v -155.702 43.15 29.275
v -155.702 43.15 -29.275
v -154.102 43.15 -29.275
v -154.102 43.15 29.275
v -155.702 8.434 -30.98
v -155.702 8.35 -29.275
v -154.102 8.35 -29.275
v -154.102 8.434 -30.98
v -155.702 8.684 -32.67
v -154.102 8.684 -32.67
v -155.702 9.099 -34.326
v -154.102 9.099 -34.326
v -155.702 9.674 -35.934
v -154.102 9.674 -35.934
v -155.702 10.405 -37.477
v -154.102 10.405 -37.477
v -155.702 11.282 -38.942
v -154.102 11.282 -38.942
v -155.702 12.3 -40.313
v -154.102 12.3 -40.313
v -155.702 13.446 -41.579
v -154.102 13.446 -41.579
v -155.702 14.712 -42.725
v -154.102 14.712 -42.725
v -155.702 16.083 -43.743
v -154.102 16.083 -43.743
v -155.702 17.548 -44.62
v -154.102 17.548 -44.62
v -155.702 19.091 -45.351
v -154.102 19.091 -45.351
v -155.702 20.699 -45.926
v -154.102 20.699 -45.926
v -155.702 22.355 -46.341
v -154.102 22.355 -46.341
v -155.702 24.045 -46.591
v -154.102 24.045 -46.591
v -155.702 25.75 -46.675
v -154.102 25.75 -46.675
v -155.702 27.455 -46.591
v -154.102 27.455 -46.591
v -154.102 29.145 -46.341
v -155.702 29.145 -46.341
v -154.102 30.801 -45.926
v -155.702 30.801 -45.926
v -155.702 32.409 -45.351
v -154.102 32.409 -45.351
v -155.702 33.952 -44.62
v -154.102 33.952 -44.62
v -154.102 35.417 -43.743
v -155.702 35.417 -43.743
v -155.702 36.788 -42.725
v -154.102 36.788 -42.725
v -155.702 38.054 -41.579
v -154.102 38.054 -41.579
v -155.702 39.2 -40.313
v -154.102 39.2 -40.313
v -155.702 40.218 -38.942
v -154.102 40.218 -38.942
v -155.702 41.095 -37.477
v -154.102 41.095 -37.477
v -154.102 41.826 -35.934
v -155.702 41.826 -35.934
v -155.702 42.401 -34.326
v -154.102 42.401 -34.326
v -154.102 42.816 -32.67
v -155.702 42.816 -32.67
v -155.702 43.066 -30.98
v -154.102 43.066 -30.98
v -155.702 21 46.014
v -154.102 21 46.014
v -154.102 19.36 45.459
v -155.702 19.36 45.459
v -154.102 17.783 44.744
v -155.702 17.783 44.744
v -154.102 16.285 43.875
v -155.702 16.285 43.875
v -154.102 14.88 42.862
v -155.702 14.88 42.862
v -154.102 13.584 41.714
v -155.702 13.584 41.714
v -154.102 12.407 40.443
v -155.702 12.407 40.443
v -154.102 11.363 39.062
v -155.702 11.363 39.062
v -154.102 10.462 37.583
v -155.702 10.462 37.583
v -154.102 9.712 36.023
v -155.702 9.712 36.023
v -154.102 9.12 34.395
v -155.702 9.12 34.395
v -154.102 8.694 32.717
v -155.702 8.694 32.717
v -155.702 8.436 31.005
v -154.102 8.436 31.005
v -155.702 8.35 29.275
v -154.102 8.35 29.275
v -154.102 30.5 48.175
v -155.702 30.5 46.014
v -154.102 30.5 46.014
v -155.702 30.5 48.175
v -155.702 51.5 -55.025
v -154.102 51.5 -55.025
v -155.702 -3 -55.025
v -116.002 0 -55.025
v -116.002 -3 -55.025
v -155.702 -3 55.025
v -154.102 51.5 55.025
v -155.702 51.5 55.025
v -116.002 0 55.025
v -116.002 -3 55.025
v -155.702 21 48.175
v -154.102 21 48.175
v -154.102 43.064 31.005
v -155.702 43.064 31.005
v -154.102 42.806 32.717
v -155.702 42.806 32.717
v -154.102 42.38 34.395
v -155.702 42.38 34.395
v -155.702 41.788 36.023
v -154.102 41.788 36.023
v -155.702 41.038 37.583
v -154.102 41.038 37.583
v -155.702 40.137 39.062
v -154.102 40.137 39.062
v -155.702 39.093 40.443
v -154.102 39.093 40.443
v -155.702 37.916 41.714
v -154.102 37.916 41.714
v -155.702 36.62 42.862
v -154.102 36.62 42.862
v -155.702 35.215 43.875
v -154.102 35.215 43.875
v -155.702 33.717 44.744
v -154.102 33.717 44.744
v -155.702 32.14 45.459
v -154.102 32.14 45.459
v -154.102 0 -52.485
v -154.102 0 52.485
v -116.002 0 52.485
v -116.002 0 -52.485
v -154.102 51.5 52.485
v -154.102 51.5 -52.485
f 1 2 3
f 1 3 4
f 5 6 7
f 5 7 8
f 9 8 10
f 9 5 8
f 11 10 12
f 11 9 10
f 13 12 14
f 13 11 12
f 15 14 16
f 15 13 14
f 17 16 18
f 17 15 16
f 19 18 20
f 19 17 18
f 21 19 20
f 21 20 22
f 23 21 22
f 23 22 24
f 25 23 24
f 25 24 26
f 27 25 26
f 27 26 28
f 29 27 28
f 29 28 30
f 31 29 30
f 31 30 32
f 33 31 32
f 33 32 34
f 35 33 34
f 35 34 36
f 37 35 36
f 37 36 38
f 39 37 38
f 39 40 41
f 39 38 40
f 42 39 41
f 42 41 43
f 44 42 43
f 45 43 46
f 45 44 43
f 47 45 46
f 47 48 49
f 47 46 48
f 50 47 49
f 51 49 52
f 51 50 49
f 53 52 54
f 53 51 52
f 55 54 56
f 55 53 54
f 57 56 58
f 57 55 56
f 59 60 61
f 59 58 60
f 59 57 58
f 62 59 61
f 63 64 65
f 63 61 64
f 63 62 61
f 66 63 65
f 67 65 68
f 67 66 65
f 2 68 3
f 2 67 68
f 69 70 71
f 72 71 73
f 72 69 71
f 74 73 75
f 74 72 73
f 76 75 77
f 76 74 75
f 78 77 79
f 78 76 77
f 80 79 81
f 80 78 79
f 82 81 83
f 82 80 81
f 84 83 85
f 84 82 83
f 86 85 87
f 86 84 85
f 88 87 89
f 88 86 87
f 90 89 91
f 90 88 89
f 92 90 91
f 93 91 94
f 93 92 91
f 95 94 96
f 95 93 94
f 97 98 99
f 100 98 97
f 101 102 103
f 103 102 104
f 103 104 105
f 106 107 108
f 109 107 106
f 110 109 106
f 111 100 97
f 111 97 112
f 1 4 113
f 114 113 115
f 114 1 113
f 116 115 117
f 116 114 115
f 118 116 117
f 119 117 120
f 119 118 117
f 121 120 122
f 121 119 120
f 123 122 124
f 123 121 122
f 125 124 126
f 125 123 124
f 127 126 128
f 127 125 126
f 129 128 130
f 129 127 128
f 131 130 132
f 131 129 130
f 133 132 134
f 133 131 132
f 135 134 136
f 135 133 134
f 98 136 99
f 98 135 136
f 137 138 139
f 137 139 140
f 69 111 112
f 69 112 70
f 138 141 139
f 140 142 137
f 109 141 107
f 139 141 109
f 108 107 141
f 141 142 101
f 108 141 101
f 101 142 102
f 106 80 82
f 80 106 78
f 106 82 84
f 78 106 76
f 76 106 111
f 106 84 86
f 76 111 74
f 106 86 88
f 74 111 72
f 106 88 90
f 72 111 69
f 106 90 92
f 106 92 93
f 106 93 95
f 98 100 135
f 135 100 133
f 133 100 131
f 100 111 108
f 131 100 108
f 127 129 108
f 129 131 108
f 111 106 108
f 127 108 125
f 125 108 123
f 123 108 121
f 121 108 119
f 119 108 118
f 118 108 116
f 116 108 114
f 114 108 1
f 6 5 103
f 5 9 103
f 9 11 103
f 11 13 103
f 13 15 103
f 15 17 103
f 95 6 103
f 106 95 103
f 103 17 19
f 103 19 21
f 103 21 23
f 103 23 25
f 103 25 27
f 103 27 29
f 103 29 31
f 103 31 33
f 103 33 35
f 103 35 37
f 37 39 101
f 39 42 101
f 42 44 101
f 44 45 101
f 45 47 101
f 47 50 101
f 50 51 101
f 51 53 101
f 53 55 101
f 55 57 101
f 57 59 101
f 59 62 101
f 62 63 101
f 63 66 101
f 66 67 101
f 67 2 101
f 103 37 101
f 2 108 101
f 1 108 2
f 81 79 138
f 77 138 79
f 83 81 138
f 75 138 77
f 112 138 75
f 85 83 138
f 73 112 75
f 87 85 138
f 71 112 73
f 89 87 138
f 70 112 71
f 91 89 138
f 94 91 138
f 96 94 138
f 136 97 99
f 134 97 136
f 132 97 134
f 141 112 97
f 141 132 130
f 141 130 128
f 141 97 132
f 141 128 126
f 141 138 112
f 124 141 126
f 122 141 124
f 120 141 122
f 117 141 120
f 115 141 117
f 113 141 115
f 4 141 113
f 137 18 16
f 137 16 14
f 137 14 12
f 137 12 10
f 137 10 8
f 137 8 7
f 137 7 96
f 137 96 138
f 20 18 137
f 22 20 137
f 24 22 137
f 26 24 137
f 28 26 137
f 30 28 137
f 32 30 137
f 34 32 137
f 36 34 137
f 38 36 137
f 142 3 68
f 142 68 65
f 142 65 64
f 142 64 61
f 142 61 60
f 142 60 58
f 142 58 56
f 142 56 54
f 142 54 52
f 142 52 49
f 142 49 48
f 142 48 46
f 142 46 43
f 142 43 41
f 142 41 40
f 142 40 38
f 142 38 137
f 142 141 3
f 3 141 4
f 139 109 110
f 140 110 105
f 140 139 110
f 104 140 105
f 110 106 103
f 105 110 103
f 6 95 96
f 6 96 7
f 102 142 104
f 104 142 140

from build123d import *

# Parameters (mm, degrees)
SKETCH2_W                = 311.404
SKETCH2_H                = 311.404
BOSS_EXTRUDE1_DEPTH      = 67.31
SKETCH4_W                = 289.56
SKETCH4_H                = 289.56
CUT_EXTRUDE1_DEPTH       = 25.4
SKETCH5_W                = 273.304
SKETCH5_H                = 273.304
CUT_EXTRUDE2_DEPTH       = 60.96
SKETCH6_W                = 304.8
SKETCH6_H                = 304.8
SKETCH6_W_2              = 298.196
SKETCH6_H_2              = 298.196
CUT_EXTRUDE3_DEPTH       = 12.7
CUT_EXTRUDE4_REACH       = 356.607
CUT_EXTRUDE5_DEPTH       = 17.45
CUT_EXTRUDE6_REACH       = 356.607
SKETCH11_W               = 76.2
SKETCH11_H               = 20.32
CUT_EXTRUDE7_DEPTH       = 17.45
CUT_EXTRUDE8_DEPTH       = 354.20286992
CUT_EXTRUDE8_DEPTH_BACK  = 354.20286992
SKETCH12_OUTSIDE_W       = 402.506
SKETCH12_OUTSIDE_H       = 158.412
SKETCH13_W               = 110.05
SKETCH13_H               = 51.5
SKETCH13_W_2             = 97.35
SKETCH13_H_2             = 38.8
BOSS_EXTRUDE2_DEPTH      = 1.6
BOSS_EXTRUDE3_DEPTH      = 38.1
BOSS_EXTRUDE3_DEPTH_BACK = 1.6
SKETCH15_W               = 110.05
SKETCH15_H               = 3
RIB1_REACH               = 199.5
SKETCH16_WALL_W          = 461.061960636
SKETCH16_WALL_H          = 2.54


with BuildPart() as part:
    # Sketch2 → Boss-Extrude1 (new body)
    with BuildSketch(Plane(origin=(0, 0, 0), x_dir=(1, 0, 0), z_dir=(0, 1, 0))):
        Rectangle(SKETCH2_W, SKETCH2_H)
    extrude(amount=BOSS_EXTRUDE1_DEPTH)

    # Sketch4 → Cut-Extrude1 (cut)
    with BuildSketch(Plane(origin=(0, 67.31, 0), x_dir=(1, 0, 0), z_dir=(0, 1, 0))):
        Rectangle(SKETCH4_W, SKETCH4_H)
    extrude(amount=-CUT_EXTRUDE1_DEPTH, mode=Mode.SUBTRACT)

    # Sketch5 → Cut-Extrude2 (cut)
    with BuildSketch(Plane(origin=(0, 67.31, 0), x_dir=(1, 0, 0), z_dir=(0, 1, 0))):
        Rectangle(SKETCH5_W, SKETCH5_H)
    extrude(amount=-CUT_EXTRUDE2_DEPTH, mode=Mode.SUBTRACT)

    # Sketch6 → Cut-Extrude3 (cut)
    with BuildSketch(Plane(origin=(0, 67.31, 0), x_dir=(1, 0, 0), z_dir=(0, 1, 0))):
        Rectangle(SKETCH6_W, SKETCH6_H)
        Rectangle(SKETCH6_W_2, SKETCH6_H_2, mode=Mode.SUBTRACT)
    extrude(amount=-CUT_EXTRUDE3_DEPTH, mode=Mode.SUBTRACT)

    # Sketch7 → Cut-Extrude4 (cut, up to next)
    with BuildSketch(Plane.ZY.offset(155.702), mode=Mode.PRIVATE) as cut_extrude4_sk1:
        with BuildLine():
            Line((-29.275, 43.15), (29.275, 43.15))
            ThreePointArc((29.275, 43.15), (46.675, 25.75), (29.275, 8.35))
            Line((29.275, 8.35), (-29.275, 8.35))
            ThreePointArc((-29.275, 8.35), (-46.675, 25.75), (-29.275, 43.15))
        make_face()
    cut_extrude4_tool1 = extrude(cut_extrude4_sk1.sketch, amount=-CUT_EXTRUDE4_REACH, mode=Mode.PRIVATE) & part.part
    add(cut_extrude4_tool1.solids().sort_by_distance((-155.702, 25.75, 0))[0], mode=Mode.SUBTRACT)

    # Sketch8 → Cut-Extrude5 (cut)
    with BuildSketch(Plane(origin=(-136.652, 0, 0), x_dir=(0, 0, -1), z_dir=(1, 0, 0))):
        Polygon((29.275, 45.15), (48.675, 45.15), (48.675, 25.75), (48.675, 6.35), (29.275, 6.35), (-29.275, 6.35), (-48.675, 6.35), (-48.675, 25.75), (-48.675, 45.15), (-29.275, 45.15), align=None)
    extrude(amount=-CUT_EXTRUDE5_DEPTH, mode=Mode.SUBTRACT)

    # Sketch9 → Cut-Extrude6 (cut, up to next)
    with BuildSketch(Plane.ZY.offset(155.702), mode=Mode.PRIVATE) as cut_extrude6_sk1:
        with BuildLine():
            Line((46.014100932, 30.5), (48.175, 30.5))
            Line((48.175, 30.5), (48.175, 21))
            Line((48.175, 21), (46.014100932, 21))
            ThreePointArc((46.014100932, 21), (46.675, 25.75), (46.014100932, 30.5))
        make_face()
    cut_extrude6_tool1 = extrude(cut_extrude6_sk1.sketch, amount=-CUT_EXTRUDE6_REACH, mode=Mode.PRIVATE) & part.part
    add(cut_extrude6_tool1.solids().sort_by_distance((-155.702, 25.75, 47.304468))[0], mode=Mode.SUBTRACT)

    # Sketch11 → Cut-Extrude7 (cut)
    with BuildSketch(Plane(origin=(-136.652, 0, 0), x_dir=(0, 0, -1), z_dir=(1, 0, 0))):
        with Locations((-86.775, 25.4)):
            Rectangle(SKETCH11_W, SKETCH11_H)
    extrude(amount=-CUT_EXTRUDE7_DEPTH, mode=Mode.SUBTRACT)

    # Sketch12 outside → Cut-Extrude8 (cut, two sides: drawn at the far end of the back side and taken through both)
    with BuildSketch(Plane(origin=(-154.102, 0, 0), x_dir=(0, 0, -1), z_dir=(1, 0, 0)).offset(-CUT_EXTRUDE8_DEPTH_BACK)):
        with Locations((0, 33.655)):
            Rectangle(SKETCH12_OUTSIDE_W, SKETCH12_OUTSIDE_H)
        Polygon((-48.675, 35.56), (-48.675, 15.24), (-48.675, 6.35), (48.675, 6.35), (48.675, 45.15), (-48.675, 45.15), align=None, mode=Mode.SUBTRACT)
    extrude(amount=CUT_EXTRUDE8_DEPTH + CUT_EXTRUDE8_DEPTH_BACK, mode=Mode.SUBTRACT)


with BuildPart() as cut_extrude8_kept_piece:
    # of the separate pieces the step leaves, the one the design keeps (cut_extrude8_pieces_kept)
    add(part.part.solids().sort_by_distance((-155.702, 6.35, 48.675))[0])

    # Sketch13 → Boss-Extrude2 (add)
    with BuildSketch(Plane(origin=(-154.102, 0, 0), x_dir=(0, 0, -1), z_dir=(1, 0, 0))):
        with Locations((0, 25.75)):
            Rectangle(SKETCH13_W, SKETCH13_H)
        with Locations((0, 25.75)):
            Rectangle(SKETCH13_W_2, SKETCH13_H_2, mode=Mode.SUBTRACT)
    extrude(amount=-BOSS_EXTRUDE2_DEPTH)

    # Sketch15 → Boss-Extrude3 (add, two sides: drawn at the far end of the back side and taken through both)
    with BuildSketch(Plane(origin=(-154.102, 0, 0), x_dir=(0, 0, -1), z_dir=(1, 0, 0)).offset(-BOSS_EXTRUDE3_DEPTH_BACK)):
        with Locations((0, -1.5)):
            Rectangle(SKETCH15_W, SKETCH15_H)
    extrude(amount=BOSS_EXTRUDE3_DEPTH + BOSS_EXTRUDE3_DEPTH_BACK)

    # Sketch16 wall → Rib1 (add, up to next)
    with BuildSketch(Plane(origin=(-135.052, 25.75, 55.025), x_dir=(0.594742134678, -0.803916533751, 0), z_dir=(0.803916533751, 0.594742134678, 0)), mode=Mode.PRIVATE) as rib1_sk1:
        with Locations((0, 1.27)):
            Rectangle(SKETCH16_WALL_W, SKETCH16_WALL_H)
    rib1_tool1 = extrude(rib1_sk1.sketch, amount=-RIB1_REACH, mode=Mode.PRIVATE) - cut_extrude8_kept_piece.part
    rib1 = rib1_tool1.solids().sort_by_distance((-135.052, 25.75, 55.025))[0]
    add(rib1)

    # Mirror1: Rib1 across plane
    add(rib1.mirror(Plane.XY))


solid = cut_extrude8_kept_piece.part
